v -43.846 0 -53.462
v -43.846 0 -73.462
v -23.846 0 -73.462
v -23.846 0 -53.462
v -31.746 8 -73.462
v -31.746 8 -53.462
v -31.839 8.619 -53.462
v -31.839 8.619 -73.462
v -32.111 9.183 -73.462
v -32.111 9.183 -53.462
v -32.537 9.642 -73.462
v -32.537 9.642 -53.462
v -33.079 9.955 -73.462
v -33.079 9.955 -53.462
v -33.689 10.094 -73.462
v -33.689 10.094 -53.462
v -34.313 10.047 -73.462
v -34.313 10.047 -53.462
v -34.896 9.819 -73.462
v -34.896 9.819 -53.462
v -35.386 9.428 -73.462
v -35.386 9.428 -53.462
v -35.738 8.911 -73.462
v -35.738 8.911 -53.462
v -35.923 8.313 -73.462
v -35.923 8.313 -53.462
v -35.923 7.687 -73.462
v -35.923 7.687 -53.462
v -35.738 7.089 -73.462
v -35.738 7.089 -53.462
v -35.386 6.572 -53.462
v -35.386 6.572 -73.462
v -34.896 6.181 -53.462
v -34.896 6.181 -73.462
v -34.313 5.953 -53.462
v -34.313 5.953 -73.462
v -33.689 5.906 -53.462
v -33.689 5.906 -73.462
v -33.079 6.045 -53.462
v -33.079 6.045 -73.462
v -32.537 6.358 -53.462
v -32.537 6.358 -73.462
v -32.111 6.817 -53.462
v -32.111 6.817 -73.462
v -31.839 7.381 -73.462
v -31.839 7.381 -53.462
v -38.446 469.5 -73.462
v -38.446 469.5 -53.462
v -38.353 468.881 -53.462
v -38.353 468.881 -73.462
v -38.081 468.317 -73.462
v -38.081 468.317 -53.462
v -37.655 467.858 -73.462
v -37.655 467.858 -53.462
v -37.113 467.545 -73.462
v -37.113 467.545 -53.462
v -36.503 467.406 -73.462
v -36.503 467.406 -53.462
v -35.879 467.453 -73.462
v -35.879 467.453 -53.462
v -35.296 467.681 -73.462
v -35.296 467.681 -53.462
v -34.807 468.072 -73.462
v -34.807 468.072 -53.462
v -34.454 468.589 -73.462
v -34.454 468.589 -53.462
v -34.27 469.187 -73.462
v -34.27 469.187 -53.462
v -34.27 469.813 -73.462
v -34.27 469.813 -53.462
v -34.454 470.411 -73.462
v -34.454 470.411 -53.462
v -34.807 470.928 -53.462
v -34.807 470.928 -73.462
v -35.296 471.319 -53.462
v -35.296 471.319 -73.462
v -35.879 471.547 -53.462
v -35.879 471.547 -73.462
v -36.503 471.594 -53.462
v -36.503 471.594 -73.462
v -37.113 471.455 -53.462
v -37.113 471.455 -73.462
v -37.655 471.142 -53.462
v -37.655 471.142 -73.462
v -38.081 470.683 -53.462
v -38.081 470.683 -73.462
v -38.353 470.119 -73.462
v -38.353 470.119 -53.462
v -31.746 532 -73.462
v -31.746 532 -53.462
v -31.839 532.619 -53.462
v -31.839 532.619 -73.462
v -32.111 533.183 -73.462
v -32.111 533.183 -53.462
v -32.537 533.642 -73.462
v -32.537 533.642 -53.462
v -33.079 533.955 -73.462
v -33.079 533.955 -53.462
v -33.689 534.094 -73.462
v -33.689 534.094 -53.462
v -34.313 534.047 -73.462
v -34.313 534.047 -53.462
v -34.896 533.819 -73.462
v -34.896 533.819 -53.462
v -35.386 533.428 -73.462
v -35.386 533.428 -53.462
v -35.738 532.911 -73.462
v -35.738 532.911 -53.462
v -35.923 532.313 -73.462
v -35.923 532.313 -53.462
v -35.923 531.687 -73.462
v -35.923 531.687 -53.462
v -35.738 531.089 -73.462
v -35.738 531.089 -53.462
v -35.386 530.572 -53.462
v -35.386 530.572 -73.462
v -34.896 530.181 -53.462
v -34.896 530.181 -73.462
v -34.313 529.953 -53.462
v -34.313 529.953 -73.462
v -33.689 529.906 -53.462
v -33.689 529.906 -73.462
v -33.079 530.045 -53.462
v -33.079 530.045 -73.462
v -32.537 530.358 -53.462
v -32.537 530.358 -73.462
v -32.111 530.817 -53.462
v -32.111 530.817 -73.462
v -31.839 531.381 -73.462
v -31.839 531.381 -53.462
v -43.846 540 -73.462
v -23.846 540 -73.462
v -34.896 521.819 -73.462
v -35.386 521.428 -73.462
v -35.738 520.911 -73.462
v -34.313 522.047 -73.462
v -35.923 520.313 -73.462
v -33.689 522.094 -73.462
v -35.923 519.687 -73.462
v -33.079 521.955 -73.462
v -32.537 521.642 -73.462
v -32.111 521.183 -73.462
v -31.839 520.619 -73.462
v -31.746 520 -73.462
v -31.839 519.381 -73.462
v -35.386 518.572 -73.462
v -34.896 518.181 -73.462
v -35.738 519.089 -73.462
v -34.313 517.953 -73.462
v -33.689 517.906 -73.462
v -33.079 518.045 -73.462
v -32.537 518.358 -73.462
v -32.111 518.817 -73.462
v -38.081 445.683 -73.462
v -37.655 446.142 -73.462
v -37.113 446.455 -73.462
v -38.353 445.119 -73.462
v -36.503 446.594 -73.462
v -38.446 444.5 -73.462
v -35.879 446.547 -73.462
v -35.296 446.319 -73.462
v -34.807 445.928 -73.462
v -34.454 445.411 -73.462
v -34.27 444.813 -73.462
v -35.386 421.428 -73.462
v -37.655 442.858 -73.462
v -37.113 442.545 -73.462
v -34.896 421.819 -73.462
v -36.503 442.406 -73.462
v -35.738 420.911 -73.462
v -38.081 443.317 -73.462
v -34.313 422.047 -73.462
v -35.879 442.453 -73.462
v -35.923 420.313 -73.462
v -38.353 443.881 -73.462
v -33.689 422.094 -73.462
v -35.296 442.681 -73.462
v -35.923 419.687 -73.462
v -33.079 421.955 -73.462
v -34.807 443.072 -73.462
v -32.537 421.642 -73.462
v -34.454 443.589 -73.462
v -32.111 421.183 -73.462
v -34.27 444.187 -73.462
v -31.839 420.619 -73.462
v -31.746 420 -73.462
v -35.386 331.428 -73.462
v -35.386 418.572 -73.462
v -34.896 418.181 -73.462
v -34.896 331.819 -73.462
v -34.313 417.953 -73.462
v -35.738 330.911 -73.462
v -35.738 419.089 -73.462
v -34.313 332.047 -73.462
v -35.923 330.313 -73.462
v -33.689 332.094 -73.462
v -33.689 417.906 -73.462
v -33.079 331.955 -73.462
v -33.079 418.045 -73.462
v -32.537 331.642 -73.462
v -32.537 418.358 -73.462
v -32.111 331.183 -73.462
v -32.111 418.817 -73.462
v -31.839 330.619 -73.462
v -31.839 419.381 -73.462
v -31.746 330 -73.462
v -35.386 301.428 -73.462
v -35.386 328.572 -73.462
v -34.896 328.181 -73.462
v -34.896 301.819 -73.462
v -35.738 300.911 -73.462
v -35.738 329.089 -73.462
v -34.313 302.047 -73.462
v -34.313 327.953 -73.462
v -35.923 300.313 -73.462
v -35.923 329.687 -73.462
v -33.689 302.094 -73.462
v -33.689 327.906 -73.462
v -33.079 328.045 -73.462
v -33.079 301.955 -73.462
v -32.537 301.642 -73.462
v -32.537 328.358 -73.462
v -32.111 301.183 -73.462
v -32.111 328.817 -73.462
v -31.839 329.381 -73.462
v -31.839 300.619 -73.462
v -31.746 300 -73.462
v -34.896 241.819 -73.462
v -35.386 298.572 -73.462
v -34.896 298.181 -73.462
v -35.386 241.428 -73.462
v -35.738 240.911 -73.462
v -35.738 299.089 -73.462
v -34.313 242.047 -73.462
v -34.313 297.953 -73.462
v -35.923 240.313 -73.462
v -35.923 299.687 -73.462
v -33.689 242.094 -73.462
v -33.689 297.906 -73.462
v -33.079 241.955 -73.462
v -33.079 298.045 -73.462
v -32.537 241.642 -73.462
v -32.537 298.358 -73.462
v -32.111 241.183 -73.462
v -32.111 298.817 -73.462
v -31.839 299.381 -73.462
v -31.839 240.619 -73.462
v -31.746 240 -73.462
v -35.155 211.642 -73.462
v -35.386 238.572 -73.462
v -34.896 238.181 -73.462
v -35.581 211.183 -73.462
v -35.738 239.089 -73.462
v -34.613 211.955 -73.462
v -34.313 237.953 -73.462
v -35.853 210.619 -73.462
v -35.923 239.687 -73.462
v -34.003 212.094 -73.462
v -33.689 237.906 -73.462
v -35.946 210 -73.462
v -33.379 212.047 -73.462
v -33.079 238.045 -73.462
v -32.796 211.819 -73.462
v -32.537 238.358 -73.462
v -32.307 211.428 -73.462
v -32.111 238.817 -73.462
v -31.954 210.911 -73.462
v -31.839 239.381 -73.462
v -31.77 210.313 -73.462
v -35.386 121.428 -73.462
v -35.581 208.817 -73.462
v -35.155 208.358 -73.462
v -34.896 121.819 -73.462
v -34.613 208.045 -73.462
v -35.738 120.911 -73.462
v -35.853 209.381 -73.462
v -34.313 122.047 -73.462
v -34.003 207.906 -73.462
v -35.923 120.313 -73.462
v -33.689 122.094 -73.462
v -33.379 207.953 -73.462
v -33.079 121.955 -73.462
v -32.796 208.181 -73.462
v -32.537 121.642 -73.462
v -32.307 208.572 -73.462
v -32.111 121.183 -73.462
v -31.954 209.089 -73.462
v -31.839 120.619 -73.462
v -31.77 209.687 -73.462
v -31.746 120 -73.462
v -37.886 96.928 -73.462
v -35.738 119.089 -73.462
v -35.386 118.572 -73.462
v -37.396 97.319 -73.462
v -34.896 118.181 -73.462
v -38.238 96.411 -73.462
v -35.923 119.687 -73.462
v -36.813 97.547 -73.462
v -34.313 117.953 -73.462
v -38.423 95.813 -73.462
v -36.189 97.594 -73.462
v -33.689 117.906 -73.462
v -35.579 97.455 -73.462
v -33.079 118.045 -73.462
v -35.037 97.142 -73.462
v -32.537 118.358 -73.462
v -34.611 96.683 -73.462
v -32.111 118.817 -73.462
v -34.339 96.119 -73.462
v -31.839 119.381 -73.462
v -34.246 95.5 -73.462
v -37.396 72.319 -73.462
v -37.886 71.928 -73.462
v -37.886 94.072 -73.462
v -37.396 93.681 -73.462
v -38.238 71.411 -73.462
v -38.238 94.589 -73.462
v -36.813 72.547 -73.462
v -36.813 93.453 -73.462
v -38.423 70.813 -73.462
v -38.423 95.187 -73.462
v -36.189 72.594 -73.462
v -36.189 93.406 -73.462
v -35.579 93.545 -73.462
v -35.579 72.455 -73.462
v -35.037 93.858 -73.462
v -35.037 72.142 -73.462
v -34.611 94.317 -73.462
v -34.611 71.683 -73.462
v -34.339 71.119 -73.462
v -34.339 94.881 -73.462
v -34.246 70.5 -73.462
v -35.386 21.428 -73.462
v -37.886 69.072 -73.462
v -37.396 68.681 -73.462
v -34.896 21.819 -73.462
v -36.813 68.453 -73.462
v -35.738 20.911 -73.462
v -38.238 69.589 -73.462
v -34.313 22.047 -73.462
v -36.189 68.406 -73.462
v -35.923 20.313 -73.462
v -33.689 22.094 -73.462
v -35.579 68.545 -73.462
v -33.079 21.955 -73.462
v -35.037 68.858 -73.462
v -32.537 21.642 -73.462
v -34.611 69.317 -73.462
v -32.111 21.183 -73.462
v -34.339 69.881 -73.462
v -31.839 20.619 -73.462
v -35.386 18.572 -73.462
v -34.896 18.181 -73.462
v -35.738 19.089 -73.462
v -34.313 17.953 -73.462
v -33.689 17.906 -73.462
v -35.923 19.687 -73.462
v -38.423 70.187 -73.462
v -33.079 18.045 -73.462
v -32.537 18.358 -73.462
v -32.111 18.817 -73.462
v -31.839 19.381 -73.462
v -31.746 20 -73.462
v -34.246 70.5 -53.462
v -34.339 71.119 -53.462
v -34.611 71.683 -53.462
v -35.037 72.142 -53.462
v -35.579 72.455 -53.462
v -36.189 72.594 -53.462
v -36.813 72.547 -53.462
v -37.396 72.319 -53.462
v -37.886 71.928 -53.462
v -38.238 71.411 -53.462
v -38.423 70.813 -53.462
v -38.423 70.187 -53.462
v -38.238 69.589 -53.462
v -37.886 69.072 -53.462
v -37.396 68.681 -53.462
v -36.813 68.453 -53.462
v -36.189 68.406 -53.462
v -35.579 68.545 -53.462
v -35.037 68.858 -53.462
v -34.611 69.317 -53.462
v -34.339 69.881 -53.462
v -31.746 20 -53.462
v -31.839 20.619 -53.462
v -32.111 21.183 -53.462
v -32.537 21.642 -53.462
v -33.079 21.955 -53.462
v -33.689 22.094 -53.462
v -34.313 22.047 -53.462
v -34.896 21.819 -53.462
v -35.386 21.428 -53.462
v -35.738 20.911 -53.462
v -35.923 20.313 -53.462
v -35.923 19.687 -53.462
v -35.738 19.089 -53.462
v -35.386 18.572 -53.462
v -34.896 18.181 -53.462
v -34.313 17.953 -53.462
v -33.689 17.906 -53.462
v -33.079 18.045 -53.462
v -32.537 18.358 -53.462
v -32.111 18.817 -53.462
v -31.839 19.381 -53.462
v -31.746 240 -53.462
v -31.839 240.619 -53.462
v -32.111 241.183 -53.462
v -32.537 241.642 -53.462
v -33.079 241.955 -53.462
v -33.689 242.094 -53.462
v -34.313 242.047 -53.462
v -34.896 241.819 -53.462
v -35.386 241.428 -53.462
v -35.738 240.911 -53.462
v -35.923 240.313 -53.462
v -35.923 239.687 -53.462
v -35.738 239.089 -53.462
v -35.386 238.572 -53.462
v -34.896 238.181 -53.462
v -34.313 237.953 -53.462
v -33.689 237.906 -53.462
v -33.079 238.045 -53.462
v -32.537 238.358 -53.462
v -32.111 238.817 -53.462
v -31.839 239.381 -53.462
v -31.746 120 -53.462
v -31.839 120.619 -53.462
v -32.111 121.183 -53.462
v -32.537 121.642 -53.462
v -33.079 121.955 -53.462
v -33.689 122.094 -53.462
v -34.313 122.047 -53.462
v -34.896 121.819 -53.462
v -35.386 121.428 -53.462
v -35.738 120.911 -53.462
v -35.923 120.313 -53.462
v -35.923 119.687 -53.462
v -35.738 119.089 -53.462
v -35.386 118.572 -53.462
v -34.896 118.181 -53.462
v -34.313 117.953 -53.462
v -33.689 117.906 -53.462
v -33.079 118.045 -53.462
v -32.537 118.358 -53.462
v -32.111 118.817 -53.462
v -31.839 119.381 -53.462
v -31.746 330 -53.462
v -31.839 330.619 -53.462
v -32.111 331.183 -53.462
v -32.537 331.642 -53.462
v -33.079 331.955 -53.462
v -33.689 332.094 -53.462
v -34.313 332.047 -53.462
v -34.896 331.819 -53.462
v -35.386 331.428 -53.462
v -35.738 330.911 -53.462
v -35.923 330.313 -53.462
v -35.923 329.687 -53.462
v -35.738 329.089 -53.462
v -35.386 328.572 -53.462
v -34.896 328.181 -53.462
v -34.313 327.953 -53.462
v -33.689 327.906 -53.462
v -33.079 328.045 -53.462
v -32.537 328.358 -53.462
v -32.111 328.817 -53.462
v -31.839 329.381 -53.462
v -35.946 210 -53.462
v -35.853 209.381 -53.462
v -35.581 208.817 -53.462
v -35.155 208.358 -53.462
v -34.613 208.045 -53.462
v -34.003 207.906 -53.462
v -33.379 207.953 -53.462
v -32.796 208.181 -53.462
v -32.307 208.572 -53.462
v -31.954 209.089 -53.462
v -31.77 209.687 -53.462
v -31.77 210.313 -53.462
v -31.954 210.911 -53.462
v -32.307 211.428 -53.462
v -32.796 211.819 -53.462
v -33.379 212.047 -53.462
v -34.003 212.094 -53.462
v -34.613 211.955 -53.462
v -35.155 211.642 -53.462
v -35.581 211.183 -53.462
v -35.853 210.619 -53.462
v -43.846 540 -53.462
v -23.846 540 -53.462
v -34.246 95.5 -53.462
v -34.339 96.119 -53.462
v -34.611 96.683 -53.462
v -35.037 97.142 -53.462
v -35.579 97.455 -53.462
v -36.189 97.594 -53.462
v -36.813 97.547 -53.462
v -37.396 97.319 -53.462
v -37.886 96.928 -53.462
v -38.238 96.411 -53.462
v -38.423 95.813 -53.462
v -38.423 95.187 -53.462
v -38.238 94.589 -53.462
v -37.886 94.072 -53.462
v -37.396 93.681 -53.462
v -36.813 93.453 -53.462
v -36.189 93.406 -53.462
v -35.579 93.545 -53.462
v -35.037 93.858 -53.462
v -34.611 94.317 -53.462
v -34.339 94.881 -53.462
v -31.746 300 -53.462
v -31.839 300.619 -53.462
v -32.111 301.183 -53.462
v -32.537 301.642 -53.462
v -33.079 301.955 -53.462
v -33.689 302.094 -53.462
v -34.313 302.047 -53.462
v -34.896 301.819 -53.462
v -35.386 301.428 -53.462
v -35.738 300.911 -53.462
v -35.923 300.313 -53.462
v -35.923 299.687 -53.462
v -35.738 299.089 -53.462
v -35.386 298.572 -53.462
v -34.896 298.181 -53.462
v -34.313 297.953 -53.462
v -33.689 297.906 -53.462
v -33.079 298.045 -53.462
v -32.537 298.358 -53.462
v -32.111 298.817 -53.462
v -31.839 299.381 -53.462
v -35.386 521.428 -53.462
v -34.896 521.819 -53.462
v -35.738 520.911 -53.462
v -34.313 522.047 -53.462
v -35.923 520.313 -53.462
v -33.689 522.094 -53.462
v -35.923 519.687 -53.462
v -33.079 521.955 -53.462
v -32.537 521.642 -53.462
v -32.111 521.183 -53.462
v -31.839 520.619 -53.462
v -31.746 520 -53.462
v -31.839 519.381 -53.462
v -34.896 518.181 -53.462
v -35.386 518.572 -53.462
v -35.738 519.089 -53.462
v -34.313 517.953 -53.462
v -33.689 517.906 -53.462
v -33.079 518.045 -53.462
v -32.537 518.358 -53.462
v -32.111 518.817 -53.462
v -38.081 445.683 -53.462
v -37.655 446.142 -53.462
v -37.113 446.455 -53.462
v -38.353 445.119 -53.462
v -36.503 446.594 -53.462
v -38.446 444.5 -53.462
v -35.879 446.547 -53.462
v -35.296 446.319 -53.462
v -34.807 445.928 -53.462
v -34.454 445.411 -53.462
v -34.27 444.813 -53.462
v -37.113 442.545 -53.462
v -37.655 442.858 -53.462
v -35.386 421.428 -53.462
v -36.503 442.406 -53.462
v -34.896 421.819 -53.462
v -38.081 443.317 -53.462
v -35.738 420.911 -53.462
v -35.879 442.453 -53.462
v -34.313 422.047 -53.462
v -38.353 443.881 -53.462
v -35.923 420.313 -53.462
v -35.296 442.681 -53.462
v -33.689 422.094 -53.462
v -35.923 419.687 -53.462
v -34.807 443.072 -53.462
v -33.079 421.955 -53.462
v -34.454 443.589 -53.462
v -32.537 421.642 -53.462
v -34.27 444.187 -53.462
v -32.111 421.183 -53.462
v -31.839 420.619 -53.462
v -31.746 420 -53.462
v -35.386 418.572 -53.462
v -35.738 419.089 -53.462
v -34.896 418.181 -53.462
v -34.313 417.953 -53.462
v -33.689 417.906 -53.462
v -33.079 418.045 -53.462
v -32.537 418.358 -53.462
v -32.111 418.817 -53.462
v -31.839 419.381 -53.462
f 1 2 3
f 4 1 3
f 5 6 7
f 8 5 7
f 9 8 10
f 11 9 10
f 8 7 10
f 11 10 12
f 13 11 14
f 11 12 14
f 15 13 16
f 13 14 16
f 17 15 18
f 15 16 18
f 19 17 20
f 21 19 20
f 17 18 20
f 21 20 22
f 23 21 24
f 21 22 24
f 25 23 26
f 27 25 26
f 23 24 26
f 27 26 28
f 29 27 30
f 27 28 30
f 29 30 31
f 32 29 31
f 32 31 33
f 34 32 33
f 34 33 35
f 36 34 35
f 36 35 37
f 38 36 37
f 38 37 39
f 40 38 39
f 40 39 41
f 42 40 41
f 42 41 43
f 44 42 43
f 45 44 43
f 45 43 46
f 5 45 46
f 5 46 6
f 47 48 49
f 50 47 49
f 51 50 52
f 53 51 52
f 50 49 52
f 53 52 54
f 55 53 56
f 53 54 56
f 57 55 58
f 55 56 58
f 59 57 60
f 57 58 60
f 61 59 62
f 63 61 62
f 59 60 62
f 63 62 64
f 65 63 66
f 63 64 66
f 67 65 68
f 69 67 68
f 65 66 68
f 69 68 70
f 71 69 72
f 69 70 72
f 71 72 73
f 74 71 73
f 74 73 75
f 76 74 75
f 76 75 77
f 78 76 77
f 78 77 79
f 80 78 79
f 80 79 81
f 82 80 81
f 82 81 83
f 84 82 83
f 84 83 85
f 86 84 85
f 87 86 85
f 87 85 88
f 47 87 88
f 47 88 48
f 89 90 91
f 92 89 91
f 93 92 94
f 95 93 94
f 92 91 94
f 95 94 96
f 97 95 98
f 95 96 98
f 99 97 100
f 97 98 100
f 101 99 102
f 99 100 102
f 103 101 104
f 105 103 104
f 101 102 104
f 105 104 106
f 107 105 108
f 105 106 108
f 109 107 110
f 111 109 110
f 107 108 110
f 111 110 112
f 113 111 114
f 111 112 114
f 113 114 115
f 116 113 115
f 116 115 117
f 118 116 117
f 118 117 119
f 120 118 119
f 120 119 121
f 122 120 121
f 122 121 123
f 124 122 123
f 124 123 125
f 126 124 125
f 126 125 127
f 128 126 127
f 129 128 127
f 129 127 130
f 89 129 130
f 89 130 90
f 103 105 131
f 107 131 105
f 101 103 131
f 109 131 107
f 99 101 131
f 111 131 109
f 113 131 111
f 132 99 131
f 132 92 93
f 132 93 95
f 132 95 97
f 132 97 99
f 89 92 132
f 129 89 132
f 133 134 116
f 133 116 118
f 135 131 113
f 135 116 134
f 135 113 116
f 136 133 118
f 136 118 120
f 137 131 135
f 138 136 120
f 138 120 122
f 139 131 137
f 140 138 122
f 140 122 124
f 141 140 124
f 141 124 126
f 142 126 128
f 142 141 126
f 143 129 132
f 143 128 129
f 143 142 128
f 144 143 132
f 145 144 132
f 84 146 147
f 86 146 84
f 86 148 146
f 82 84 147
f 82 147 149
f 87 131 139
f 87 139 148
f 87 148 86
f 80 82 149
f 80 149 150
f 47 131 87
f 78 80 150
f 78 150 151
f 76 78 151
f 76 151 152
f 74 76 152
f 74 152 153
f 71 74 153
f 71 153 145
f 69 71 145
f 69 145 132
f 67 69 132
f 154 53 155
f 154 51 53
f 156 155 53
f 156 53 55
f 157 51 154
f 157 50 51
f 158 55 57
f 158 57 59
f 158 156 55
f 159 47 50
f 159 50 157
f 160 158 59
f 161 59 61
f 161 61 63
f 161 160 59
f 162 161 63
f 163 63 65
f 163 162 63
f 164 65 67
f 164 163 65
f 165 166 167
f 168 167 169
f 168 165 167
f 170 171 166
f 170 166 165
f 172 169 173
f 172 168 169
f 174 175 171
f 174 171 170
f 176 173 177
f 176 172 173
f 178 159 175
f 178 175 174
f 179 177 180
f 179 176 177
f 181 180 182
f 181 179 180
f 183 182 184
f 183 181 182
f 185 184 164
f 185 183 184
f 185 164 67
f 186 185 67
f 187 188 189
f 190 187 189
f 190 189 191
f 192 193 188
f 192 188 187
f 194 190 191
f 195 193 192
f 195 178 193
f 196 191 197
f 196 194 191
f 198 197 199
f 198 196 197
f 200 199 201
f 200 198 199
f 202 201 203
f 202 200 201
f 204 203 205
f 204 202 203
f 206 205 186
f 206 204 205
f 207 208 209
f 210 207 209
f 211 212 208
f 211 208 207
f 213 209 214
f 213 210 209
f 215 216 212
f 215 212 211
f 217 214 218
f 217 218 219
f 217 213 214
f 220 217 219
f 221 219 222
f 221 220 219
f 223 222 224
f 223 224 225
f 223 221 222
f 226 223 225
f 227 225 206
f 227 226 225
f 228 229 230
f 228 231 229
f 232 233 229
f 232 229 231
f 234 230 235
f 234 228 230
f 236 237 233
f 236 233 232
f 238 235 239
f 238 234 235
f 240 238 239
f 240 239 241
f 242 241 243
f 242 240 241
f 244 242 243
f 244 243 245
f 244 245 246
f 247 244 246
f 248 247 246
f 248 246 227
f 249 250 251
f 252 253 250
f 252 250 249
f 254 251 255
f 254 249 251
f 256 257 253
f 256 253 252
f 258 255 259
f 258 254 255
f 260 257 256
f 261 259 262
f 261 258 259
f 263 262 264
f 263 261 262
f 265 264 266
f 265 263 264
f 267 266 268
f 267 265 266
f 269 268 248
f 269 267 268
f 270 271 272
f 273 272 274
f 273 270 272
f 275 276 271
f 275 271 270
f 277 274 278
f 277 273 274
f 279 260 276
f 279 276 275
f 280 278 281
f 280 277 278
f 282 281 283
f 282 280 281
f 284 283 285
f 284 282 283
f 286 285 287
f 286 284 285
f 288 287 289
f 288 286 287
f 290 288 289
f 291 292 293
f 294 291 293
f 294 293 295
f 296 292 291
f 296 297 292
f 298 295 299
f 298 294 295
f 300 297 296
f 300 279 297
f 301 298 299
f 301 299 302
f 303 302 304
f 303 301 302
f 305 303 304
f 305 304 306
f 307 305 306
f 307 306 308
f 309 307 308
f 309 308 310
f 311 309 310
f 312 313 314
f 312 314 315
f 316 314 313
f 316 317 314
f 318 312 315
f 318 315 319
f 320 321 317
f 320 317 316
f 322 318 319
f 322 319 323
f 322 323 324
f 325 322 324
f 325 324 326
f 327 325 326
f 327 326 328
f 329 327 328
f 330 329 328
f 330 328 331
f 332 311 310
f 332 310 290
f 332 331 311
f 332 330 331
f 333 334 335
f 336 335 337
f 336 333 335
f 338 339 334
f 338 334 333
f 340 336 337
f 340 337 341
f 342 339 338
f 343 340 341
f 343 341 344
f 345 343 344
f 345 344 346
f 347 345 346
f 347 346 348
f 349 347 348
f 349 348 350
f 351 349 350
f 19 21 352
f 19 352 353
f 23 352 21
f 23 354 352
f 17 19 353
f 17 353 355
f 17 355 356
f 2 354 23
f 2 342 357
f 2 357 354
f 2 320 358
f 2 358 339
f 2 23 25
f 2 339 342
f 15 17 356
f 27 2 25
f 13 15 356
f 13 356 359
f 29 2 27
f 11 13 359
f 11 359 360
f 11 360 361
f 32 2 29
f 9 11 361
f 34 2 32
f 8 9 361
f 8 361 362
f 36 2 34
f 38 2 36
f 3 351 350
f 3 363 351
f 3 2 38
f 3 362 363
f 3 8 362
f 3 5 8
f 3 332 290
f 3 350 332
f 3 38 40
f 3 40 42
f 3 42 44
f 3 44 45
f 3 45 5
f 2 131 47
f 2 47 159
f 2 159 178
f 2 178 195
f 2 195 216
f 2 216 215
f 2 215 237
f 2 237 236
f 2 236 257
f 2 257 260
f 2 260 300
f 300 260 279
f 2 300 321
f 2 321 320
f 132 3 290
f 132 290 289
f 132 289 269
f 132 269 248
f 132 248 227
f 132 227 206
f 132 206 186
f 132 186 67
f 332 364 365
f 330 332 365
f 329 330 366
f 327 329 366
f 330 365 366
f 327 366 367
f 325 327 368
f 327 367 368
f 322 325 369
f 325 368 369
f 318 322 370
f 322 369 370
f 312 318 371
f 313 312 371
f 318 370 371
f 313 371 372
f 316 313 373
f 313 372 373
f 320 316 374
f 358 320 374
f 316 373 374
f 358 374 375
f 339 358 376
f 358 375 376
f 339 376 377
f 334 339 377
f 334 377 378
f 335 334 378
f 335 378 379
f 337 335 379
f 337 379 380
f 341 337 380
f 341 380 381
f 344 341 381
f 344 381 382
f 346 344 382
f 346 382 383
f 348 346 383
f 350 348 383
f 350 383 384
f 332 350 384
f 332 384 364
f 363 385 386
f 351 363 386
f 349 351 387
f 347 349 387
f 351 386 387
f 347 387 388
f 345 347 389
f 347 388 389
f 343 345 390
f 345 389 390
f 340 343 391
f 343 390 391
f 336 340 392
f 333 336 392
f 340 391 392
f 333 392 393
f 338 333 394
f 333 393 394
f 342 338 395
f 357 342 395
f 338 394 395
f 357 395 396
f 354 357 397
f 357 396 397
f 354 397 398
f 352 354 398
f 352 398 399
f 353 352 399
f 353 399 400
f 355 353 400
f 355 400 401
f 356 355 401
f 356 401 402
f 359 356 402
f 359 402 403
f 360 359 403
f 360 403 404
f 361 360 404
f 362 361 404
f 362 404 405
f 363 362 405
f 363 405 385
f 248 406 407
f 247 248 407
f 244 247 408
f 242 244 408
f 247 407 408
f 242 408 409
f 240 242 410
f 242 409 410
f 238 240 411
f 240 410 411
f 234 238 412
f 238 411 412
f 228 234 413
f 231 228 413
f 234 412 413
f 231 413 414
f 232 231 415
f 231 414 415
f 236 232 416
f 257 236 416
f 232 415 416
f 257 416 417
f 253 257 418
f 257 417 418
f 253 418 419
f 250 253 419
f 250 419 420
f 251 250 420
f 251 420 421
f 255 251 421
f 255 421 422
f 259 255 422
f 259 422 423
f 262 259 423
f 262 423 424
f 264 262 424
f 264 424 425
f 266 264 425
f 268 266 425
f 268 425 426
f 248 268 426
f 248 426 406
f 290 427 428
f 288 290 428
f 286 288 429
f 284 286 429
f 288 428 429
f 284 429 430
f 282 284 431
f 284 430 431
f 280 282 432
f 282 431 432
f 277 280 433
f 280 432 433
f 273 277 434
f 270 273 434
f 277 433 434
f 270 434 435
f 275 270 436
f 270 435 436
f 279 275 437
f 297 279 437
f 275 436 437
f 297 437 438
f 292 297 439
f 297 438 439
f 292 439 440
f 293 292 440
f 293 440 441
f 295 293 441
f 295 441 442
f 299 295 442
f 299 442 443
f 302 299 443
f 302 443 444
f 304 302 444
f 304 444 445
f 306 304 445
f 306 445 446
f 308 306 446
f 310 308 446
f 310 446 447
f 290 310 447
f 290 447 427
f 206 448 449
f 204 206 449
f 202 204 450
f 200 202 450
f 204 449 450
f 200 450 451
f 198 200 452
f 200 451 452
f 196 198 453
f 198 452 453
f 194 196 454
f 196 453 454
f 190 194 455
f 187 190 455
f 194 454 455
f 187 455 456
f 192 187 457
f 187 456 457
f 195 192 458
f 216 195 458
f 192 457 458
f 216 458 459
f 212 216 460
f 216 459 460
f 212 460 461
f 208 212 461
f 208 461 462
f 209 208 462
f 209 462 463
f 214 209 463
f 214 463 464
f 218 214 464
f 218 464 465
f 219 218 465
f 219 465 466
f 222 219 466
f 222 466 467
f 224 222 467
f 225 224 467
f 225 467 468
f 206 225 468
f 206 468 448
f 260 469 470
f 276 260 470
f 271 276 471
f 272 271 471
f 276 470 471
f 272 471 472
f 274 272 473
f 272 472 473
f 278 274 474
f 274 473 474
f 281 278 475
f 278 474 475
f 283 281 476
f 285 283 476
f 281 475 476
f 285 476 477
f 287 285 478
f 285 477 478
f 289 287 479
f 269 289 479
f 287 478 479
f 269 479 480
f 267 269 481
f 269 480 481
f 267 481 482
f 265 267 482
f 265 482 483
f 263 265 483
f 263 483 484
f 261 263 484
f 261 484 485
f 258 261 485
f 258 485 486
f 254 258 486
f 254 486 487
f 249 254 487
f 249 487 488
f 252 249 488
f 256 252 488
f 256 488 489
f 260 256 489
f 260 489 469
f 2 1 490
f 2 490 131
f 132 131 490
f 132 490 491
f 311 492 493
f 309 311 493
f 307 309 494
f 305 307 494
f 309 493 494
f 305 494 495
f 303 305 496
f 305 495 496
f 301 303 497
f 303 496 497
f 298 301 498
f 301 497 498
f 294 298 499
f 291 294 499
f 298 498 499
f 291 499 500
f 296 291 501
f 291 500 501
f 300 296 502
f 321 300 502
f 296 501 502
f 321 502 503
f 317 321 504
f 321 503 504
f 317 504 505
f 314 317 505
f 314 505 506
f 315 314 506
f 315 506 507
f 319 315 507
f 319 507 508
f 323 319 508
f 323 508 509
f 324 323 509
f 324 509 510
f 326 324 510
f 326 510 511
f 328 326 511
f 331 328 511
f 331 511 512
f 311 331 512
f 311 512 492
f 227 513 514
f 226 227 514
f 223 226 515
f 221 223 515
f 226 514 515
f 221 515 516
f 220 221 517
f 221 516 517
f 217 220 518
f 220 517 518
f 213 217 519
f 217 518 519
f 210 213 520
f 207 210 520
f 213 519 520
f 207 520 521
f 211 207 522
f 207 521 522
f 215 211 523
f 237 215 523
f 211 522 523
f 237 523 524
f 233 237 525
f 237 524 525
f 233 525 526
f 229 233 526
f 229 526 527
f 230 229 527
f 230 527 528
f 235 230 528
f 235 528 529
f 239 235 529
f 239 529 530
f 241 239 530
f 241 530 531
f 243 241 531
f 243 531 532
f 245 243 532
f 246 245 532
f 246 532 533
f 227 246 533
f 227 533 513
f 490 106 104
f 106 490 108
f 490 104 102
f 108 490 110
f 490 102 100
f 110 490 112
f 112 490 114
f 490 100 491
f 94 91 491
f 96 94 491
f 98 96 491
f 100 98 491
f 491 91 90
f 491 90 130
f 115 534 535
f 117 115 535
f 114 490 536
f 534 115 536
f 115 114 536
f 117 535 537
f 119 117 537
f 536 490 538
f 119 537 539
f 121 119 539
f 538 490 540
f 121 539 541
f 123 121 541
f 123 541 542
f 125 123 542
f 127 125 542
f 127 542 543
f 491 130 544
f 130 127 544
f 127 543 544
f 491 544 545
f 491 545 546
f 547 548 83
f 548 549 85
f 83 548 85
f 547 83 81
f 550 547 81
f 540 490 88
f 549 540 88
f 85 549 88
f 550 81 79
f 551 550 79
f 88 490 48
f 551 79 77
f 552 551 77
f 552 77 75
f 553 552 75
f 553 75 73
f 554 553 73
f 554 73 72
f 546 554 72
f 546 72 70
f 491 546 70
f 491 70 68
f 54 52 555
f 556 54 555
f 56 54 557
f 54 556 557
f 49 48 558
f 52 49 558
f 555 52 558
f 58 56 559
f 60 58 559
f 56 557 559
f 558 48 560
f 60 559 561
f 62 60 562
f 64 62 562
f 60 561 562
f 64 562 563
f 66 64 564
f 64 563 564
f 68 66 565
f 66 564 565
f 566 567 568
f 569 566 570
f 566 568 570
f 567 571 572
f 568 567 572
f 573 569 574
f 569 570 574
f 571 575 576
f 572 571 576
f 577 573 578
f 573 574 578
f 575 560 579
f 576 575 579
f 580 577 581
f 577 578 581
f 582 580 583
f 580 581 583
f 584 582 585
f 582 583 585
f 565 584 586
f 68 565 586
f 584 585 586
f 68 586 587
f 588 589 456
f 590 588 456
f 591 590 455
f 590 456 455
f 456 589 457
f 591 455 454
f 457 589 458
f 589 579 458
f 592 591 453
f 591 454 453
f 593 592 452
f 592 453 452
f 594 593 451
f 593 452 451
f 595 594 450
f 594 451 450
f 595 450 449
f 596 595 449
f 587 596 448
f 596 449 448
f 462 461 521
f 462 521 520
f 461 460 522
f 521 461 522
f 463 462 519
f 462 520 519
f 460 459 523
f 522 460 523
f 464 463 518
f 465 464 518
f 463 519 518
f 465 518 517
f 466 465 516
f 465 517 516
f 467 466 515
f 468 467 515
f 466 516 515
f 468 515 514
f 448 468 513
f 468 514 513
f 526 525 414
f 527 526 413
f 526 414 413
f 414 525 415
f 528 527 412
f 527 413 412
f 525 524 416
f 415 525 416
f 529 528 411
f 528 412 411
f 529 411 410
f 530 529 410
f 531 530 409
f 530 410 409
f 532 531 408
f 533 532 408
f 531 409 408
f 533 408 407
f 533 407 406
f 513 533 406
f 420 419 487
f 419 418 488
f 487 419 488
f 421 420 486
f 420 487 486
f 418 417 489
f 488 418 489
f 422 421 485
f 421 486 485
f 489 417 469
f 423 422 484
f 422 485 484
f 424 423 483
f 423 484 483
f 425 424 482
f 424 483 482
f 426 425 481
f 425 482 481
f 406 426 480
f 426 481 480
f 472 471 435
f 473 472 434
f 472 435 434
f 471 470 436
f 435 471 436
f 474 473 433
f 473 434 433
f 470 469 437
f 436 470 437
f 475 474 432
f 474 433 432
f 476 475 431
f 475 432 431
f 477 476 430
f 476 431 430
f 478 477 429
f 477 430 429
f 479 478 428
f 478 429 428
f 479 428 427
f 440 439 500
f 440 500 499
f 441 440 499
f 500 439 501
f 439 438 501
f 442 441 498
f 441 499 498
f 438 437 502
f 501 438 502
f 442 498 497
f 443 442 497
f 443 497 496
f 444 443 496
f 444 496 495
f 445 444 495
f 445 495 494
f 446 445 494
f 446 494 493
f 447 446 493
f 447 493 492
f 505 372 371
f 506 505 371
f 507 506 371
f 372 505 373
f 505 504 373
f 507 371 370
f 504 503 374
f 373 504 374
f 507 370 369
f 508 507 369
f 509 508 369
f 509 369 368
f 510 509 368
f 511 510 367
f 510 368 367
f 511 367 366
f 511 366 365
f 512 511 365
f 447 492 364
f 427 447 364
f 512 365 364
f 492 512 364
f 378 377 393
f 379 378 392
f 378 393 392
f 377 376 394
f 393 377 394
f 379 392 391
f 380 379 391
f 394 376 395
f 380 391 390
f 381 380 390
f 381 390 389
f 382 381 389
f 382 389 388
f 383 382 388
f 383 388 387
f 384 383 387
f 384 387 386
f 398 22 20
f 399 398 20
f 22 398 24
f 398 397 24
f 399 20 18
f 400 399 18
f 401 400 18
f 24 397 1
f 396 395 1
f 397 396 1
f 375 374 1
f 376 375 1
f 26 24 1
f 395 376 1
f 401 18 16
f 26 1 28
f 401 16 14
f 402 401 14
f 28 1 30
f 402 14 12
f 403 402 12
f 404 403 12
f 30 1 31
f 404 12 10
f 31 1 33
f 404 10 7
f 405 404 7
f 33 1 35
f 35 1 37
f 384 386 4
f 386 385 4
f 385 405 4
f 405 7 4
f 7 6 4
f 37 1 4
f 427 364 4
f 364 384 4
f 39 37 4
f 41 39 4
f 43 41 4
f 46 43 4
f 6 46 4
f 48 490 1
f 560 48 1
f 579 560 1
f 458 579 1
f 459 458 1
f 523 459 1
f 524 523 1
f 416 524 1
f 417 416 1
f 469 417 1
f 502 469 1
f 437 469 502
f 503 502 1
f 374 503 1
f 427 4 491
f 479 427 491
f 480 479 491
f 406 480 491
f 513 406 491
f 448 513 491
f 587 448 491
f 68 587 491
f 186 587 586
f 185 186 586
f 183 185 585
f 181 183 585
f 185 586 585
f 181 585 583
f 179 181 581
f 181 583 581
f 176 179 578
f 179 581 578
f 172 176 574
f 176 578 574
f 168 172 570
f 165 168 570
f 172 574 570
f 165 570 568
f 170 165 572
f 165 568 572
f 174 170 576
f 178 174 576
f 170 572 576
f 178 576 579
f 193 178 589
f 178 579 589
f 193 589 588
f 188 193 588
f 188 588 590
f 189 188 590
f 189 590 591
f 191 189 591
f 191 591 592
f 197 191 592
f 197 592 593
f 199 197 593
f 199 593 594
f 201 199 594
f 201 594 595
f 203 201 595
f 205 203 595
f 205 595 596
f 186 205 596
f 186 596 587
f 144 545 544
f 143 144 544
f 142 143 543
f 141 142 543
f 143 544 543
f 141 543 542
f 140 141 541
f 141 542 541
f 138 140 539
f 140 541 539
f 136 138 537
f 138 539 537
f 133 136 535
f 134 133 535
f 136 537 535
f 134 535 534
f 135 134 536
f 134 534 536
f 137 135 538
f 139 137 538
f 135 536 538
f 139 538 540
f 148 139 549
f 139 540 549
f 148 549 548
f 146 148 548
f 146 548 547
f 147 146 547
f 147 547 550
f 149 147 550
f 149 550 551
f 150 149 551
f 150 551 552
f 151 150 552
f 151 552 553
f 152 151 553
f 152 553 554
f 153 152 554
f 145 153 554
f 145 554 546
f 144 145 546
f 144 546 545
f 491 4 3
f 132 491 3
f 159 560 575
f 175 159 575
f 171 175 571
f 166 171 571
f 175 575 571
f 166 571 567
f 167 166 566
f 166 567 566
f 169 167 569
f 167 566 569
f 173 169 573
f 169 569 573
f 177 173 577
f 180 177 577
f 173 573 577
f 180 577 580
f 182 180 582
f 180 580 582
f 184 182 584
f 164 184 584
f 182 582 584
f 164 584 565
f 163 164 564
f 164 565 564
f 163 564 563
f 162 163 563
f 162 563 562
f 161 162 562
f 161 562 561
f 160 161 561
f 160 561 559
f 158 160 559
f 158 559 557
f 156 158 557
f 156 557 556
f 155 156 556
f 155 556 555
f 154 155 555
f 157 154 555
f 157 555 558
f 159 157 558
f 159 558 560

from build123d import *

# Parameters (mm, degrees)
SKETCH_1_W          = 20
SKETCH_1_H          = 20
EXTRUDE_1_DEPTH     = 540
SKETCH_2_R          = 2.1
CUT_EXTRUDE_1_DEPTH = 543.146184352
SKETCH_3_R          = 2.1
CUT_EXTRUDE_2_DEPTH = 543.146184352
SKETCH_4_R          = 2.1
CUT_EXTRUDE_3_DEPTH = 140


with BuildPart() as part:
    # 草图1 → 凸台-拉伸1 (new body)
    with BuildSketch(Plane(origin=(0, 0, 0), x_dir=(1, 0, 0), z_dir=(0, 1, 0))):
        with Locations((-33.846153846, 63.461538462)):
            Rectangle(SKETCH_1_W, SKETCH_1_H)
    extrude(amount=EXTRUDE_1_DEPTH)

    # 草图2 → 切除-拉伸1 (cut, through all)
    with BuildSketch(Plane.XY.offset(-53.461538462)):
        with Locations((-33.846153846, 330)):
            Circle(SKETCH_2_R)
        with Locations(Location((-33.846153846, 210, 0), (0, 0, 180))):
            Circle(SKETCH_2_R)
        with Locations((-33.846153846, 420)):
            Circle(SKETCH_2_R)
        with Locations((-33.846153846, 300)):
            Circle(SKETCH_2_R)
        with Locations((-33.846153846, 240)):
            Circle(SKETCH_2_R)
        with Locations((-33.846153846, 120)):
            Circle(SKETCH_2_R)
    extrude(amount=-CUT_EXTRUDE_1_DEPTH, mode=Mode.SUBTRACT)

    # 草图3 → 切除-拉伸2 (cut, through all)
    with BuildSketch(Plane.XY.offset(-53.461538462)):
        with Locations((-36.346153846, 70.5)):
            Circle(SKETCH_3_R)
        with Locations((-36.346153846, 95.5)):
            Circle(SKETCH_3_R)
        with Locations(Location((-36.346153846, 444.5, 0), (0, 0, 180))):
            Circle(SKETCH_3_R)
        with Locations(Location((-36.346153846, 469.5, 0), (0, 0, 180))):
            Circle(SKETCH_3_R)
    extrude(amount=-CUT_EXTRUDE_2_DEPTH, mode=Mode.SUBTRACT)

    # 草图4 → 切除-拉伸3 (cut)
    with BuildSketch(Plane.XY.offset(-53.461538462)):
        with Locations((-33.846153846, 8)):
            Circle(SKETCH_4_R)
        with Locations((-33.846153846, 20)):
            Circle(SKETCH_4_R)
        with Locations((-33.846153846, 520)):
            Circle(SKETCH_4_R)
        with Locations((-33.846153846, 532)):
            Circle(SKETCH_4_R)
    extrude(amount=-CUT_EXTRUDE_3_DEPTH, mode=Mode.SUBTRACT)


solid = part.part
